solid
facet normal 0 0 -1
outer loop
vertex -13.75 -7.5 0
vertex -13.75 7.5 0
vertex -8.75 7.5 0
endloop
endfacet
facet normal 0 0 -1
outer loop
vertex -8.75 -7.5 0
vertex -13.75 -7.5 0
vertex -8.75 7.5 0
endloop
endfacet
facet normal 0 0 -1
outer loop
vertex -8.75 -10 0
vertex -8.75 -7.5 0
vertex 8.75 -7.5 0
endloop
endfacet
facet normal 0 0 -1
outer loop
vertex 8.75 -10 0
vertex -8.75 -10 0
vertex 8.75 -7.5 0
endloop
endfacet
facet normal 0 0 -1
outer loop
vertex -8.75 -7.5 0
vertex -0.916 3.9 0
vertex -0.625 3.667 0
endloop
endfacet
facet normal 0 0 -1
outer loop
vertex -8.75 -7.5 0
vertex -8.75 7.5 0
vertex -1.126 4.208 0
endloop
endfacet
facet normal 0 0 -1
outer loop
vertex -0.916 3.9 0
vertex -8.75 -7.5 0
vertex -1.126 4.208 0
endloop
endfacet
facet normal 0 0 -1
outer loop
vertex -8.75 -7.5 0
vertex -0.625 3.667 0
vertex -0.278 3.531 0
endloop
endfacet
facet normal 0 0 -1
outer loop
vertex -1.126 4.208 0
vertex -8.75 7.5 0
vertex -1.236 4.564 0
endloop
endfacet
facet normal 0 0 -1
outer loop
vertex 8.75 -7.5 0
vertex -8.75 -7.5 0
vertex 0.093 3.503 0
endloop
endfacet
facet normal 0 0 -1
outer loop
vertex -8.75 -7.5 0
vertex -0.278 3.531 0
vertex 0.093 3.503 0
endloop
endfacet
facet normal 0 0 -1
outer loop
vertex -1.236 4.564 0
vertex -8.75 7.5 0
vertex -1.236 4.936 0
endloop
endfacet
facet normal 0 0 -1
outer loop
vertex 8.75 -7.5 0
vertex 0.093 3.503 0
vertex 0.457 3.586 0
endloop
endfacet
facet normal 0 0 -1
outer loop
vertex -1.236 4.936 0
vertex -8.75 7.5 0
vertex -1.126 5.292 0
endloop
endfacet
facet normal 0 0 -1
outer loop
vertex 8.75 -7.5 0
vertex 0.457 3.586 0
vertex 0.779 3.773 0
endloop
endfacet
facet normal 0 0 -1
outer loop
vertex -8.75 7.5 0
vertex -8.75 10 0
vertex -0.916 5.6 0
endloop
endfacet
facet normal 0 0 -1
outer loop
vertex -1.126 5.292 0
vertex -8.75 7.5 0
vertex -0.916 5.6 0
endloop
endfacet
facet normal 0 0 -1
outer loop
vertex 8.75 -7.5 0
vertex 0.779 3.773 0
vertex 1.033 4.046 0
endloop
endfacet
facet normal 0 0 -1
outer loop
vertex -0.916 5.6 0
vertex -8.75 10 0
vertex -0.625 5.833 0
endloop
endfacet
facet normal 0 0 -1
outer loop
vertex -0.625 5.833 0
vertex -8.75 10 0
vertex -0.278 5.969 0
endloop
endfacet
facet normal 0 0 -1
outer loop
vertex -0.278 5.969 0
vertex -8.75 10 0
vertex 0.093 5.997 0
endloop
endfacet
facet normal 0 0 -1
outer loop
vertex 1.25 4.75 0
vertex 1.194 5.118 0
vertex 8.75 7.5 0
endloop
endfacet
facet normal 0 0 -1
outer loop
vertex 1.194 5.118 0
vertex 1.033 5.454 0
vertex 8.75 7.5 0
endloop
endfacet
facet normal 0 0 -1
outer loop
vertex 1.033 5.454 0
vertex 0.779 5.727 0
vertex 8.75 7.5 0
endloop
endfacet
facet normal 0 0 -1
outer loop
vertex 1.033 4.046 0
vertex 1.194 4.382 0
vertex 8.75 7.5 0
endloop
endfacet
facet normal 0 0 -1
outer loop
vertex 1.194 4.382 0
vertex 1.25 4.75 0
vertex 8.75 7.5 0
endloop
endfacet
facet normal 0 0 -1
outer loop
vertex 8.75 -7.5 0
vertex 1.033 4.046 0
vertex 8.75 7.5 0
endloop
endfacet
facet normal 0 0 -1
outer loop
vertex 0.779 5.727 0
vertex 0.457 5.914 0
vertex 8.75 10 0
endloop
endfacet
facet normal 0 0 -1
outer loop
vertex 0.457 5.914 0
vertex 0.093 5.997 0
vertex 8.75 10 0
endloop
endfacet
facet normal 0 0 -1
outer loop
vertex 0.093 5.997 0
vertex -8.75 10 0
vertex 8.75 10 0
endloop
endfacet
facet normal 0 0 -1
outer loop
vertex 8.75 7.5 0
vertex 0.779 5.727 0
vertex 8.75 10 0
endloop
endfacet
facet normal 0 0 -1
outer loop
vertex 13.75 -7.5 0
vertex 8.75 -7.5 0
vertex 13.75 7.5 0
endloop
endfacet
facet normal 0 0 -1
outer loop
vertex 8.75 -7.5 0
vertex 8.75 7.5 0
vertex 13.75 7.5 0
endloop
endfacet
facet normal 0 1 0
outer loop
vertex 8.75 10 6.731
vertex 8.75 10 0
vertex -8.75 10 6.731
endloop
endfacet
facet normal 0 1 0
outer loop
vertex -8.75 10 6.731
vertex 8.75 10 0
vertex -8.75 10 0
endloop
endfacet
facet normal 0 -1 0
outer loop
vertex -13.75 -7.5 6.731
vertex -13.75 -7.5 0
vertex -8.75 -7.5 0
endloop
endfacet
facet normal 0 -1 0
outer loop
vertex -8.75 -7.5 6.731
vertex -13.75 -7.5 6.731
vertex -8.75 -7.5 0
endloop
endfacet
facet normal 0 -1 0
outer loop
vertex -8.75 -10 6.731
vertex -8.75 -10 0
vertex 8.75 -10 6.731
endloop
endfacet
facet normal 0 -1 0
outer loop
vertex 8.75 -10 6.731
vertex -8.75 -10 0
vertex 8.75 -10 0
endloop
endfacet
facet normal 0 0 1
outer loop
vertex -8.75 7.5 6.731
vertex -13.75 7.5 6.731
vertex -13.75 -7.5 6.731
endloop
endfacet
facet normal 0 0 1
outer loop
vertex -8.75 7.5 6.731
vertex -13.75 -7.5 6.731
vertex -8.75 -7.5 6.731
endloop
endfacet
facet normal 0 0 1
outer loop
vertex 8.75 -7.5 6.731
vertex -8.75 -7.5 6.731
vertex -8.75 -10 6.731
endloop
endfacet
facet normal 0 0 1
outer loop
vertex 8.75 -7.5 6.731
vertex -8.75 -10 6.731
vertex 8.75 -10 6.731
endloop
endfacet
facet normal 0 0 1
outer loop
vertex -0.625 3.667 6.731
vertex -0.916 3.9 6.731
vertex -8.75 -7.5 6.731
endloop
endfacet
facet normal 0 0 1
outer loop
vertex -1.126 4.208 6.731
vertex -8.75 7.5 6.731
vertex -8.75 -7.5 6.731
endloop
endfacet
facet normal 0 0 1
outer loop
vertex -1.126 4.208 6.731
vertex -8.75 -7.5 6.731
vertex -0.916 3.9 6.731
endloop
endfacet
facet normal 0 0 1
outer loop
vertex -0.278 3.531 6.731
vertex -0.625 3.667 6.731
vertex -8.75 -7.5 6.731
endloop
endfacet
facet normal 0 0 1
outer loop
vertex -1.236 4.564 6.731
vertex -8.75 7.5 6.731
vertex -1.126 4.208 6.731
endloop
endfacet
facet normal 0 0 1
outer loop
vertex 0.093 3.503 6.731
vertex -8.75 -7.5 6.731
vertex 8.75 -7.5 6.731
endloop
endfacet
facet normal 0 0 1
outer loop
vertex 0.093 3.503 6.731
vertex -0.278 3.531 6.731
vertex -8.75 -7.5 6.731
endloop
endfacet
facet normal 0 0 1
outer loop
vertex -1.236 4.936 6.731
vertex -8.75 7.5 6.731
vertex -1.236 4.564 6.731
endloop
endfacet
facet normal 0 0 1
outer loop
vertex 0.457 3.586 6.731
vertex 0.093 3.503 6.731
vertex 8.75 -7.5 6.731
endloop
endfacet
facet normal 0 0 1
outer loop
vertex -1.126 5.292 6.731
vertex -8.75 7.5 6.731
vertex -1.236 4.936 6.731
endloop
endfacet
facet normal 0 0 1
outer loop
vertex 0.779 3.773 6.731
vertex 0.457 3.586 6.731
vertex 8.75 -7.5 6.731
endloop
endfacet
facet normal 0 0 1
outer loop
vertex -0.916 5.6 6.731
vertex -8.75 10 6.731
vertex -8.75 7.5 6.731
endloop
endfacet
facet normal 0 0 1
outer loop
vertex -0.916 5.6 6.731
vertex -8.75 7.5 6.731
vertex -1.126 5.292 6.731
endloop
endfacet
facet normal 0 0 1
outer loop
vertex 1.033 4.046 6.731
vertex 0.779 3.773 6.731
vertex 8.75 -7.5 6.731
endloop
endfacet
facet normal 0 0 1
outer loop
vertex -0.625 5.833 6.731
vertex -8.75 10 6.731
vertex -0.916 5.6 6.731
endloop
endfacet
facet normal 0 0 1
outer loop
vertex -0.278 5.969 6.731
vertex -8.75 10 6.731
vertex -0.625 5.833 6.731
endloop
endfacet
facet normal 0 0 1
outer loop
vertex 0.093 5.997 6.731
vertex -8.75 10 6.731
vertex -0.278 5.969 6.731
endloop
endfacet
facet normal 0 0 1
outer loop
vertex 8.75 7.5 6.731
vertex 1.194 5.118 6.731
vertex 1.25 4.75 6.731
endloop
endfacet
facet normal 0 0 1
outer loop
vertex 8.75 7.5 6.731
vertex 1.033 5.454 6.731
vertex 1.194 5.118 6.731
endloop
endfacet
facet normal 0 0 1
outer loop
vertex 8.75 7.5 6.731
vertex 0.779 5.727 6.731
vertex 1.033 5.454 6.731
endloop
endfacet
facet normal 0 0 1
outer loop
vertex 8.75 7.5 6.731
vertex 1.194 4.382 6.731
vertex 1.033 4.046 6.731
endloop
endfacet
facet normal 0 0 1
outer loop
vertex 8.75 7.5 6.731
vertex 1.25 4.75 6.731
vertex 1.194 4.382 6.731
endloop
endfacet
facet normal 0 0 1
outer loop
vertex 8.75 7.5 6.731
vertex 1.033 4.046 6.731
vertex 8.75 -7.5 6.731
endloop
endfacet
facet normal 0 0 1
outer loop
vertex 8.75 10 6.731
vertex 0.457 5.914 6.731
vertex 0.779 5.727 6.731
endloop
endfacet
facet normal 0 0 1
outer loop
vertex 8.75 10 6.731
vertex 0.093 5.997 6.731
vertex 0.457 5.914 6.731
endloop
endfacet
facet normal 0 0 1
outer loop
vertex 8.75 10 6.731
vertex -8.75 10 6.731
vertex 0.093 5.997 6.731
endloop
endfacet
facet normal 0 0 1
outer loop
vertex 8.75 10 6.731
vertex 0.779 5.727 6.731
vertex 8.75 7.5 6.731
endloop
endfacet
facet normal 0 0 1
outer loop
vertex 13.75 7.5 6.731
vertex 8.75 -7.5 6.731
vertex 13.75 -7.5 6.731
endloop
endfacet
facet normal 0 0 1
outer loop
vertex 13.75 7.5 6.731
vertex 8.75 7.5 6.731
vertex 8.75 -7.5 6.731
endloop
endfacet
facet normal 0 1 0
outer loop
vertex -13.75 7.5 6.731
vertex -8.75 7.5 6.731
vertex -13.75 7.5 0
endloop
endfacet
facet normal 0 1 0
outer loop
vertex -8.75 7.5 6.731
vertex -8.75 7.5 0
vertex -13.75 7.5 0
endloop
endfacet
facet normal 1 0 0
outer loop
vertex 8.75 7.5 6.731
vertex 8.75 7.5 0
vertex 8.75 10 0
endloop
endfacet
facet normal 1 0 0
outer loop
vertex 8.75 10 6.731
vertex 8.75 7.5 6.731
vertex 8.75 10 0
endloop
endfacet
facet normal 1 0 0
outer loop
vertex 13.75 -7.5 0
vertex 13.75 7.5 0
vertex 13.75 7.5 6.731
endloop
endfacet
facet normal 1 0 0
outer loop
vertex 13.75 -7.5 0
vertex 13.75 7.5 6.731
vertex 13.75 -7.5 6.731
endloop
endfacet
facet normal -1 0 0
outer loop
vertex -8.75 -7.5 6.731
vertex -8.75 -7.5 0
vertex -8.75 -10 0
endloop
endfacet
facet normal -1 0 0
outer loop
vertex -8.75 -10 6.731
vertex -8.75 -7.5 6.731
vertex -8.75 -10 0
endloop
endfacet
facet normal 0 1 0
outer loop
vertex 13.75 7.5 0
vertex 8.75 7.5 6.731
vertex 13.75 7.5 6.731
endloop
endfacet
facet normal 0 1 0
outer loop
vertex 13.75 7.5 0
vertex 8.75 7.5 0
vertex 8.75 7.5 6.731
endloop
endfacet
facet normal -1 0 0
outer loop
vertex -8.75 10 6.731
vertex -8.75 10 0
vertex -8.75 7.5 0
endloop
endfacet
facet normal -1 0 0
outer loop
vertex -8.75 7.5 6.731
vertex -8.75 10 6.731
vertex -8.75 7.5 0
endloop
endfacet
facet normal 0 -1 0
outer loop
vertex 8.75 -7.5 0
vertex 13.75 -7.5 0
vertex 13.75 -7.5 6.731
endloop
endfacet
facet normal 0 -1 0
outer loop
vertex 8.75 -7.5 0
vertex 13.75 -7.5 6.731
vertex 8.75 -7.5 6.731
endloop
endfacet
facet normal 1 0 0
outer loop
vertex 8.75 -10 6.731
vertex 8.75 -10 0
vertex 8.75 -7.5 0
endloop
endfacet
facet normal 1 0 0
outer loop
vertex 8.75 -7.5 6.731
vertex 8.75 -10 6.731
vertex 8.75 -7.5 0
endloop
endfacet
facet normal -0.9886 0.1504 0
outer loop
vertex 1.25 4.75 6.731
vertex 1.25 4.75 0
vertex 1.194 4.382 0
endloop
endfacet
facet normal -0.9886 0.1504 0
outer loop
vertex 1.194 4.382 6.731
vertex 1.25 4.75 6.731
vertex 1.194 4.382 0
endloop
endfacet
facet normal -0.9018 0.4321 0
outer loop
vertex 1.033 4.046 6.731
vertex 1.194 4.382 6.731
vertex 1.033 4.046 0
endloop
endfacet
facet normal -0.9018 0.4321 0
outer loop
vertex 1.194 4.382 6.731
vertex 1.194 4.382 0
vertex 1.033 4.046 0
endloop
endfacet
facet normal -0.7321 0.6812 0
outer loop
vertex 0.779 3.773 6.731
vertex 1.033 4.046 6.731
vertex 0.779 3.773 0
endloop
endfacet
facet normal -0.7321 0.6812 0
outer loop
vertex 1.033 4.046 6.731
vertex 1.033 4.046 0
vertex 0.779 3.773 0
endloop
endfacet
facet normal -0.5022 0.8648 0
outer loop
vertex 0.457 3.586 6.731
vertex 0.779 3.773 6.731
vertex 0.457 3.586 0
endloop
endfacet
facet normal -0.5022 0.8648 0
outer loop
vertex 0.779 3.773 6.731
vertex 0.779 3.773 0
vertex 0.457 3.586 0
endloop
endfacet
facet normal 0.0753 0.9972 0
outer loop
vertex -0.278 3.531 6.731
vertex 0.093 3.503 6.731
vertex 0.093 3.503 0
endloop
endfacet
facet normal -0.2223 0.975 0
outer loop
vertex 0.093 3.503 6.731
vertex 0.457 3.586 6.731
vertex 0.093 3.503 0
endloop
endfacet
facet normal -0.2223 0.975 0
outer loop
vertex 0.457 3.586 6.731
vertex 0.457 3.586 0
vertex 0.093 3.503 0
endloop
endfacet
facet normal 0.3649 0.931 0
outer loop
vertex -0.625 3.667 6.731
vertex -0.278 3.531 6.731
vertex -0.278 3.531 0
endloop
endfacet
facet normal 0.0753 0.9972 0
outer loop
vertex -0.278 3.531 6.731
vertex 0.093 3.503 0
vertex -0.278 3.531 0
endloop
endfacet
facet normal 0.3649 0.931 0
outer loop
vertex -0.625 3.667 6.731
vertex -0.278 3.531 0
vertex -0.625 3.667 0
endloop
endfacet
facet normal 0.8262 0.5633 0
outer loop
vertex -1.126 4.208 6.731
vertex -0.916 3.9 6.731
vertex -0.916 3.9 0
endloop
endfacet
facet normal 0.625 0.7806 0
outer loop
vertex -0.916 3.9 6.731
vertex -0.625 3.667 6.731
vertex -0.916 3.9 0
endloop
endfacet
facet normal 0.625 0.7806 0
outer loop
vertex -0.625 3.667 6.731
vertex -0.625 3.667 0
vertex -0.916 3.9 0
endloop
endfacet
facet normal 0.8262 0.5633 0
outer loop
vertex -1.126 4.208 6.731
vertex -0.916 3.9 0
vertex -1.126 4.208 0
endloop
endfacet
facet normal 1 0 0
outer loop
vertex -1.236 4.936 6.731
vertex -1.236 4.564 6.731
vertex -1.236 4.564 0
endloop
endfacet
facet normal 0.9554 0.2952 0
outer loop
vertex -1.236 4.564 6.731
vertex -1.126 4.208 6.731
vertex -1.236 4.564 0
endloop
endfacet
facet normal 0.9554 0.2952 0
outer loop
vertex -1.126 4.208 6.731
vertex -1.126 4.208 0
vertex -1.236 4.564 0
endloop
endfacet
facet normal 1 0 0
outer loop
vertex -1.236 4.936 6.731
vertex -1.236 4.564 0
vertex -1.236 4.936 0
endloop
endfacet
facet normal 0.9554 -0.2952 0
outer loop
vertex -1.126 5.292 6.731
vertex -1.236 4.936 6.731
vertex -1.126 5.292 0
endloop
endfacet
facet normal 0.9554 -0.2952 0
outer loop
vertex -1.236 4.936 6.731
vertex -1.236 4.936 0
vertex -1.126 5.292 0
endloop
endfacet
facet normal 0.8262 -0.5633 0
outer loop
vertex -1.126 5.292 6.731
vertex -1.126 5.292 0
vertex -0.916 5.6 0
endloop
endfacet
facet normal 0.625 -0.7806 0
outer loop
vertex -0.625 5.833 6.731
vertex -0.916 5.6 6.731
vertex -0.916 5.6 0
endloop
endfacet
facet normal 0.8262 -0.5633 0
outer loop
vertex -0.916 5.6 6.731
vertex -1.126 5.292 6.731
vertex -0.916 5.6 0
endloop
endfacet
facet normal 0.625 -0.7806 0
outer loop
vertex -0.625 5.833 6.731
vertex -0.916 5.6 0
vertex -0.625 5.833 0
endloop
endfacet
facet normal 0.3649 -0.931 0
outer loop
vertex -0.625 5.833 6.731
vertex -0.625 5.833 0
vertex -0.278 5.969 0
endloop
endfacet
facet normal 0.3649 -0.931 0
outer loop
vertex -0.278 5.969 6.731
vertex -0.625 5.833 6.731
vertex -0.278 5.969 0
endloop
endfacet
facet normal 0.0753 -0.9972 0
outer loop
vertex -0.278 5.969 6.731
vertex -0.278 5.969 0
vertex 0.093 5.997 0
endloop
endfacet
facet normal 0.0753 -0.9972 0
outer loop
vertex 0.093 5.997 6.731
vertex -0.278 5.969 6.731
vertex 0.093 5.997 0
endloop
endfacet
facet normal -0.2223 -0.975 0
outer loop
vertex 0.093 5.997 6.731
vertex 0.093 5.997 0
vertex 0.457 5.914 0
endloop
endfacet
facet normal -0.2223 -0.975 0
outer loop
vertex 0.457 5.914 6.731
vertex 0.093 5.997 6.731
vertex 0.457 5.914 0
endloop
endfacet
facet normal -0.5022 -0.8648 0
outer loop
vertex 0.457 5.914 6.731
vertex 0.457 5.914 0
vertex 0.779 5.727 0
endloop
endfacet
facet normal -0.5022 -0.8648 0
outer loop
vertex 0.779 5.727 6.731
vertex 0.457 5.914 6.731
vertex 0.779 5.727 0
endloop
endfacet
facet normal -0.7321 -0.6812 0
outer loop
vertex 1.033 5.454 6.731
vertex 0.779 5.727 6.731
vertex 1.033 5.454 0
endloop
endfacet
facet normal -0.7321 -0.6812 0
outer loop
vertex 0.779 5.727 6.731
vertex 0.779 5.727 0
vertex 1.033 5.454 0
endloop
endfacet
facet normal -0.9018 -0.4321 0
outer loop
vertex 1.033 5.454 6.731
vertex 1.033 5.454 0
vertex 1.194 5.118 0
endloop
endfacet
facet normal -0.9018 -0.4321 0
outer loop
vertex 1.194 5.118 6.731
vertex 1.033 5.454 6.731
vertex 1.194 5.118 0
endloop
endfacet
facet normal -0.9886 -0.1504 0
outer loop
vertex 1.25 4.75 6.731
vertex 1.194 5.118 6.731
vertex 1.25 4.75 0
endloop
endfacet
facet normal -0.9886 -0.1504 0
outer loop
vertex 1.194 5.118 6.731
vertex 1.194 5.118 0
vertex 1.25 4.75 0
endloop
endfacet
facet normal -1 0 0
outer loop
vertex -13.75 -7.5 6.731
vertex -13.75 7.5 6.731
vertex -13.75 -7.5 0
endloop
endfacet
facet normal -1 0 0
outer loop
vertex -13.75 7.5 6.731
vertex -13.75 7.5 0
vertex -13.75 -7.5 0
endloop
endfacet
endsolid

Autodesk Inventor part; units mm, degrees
ref_plane "YZ Plane" through (0, 0, 0) normal (1, 0, 0) x (0, 1, 0)
ref_plane "XZ Plane" through (0, 0, 0) normal (0, 1, 0) x (-1, 0, 0)
ref_plane "XY Plane" through (0, 0, 0) normal (0, 0, 1) x (1, 0, 0)
sketch "Sketch1" plane through (0, 0, 0) normal (0, 0, 1) x (1, 0, 0)
  line L0 (-8.75, -10) -> (8.75, -10)
  line L1 (8.75, -10) -> (8.75, 10)
  line L2 (8.75, 10) -> (-8.75, 10)
  line L3 (-8.75, 10) -> (-8.75, -10)
  line L4 (8.75, 7.5) -> (13.75, 7.5)
  line L5 (13.75, 7.5) -> (13.75, -7.5)
  line L6 (13.75, -7.5) -> (8.75, -7.5)
  line L7 (8.75, -7.5) -> (8.75, 7.5)
  line L8 (-8.75, 7.5) -> (-13.75, 7.5)
  line L9 (-13.75, 7.5) -> (-13.75, -7.5)
  line L10 (-13.75, -7.5) -> (-8.75, -7.5)
  line L11 (-8.75, -7.5) -> (-8.75, 7.5)
  circle A0 centre (0, 4.75) radius 1.25
  point P0 (0, 0)
  point P1 (8.75, 0)
  point P2 (0, 10)
  point P3 (-13.75, 0)
  point P4 (13.75, 0)
  dimension "d0" = 5
  dimension "d1" = 17.5
  dimension "d2" = 20
  dimension "d3" = 15
  dimension "d7" = 8.75
  dimension "d9" = 2.5
  dimension "d10" = 2.5
  dimension "d11" = 4.75
extrude "Extrusion1" add sketch "Sketch1" along normal blind 6.731
equation "\"d7\" = 0.5 * d1"
equation "\"d4\" = THICKB"
equation "\"THICKA\" = 3.175"
equation "\"THICKB\" = 6.731"
equation "\"THICKC\" = 12.7"
equation "\"BALLDIA\" = 12"
equation "\"MAGDIA\" = 9.5"
properties part number "Air2D_Front_Feed"
